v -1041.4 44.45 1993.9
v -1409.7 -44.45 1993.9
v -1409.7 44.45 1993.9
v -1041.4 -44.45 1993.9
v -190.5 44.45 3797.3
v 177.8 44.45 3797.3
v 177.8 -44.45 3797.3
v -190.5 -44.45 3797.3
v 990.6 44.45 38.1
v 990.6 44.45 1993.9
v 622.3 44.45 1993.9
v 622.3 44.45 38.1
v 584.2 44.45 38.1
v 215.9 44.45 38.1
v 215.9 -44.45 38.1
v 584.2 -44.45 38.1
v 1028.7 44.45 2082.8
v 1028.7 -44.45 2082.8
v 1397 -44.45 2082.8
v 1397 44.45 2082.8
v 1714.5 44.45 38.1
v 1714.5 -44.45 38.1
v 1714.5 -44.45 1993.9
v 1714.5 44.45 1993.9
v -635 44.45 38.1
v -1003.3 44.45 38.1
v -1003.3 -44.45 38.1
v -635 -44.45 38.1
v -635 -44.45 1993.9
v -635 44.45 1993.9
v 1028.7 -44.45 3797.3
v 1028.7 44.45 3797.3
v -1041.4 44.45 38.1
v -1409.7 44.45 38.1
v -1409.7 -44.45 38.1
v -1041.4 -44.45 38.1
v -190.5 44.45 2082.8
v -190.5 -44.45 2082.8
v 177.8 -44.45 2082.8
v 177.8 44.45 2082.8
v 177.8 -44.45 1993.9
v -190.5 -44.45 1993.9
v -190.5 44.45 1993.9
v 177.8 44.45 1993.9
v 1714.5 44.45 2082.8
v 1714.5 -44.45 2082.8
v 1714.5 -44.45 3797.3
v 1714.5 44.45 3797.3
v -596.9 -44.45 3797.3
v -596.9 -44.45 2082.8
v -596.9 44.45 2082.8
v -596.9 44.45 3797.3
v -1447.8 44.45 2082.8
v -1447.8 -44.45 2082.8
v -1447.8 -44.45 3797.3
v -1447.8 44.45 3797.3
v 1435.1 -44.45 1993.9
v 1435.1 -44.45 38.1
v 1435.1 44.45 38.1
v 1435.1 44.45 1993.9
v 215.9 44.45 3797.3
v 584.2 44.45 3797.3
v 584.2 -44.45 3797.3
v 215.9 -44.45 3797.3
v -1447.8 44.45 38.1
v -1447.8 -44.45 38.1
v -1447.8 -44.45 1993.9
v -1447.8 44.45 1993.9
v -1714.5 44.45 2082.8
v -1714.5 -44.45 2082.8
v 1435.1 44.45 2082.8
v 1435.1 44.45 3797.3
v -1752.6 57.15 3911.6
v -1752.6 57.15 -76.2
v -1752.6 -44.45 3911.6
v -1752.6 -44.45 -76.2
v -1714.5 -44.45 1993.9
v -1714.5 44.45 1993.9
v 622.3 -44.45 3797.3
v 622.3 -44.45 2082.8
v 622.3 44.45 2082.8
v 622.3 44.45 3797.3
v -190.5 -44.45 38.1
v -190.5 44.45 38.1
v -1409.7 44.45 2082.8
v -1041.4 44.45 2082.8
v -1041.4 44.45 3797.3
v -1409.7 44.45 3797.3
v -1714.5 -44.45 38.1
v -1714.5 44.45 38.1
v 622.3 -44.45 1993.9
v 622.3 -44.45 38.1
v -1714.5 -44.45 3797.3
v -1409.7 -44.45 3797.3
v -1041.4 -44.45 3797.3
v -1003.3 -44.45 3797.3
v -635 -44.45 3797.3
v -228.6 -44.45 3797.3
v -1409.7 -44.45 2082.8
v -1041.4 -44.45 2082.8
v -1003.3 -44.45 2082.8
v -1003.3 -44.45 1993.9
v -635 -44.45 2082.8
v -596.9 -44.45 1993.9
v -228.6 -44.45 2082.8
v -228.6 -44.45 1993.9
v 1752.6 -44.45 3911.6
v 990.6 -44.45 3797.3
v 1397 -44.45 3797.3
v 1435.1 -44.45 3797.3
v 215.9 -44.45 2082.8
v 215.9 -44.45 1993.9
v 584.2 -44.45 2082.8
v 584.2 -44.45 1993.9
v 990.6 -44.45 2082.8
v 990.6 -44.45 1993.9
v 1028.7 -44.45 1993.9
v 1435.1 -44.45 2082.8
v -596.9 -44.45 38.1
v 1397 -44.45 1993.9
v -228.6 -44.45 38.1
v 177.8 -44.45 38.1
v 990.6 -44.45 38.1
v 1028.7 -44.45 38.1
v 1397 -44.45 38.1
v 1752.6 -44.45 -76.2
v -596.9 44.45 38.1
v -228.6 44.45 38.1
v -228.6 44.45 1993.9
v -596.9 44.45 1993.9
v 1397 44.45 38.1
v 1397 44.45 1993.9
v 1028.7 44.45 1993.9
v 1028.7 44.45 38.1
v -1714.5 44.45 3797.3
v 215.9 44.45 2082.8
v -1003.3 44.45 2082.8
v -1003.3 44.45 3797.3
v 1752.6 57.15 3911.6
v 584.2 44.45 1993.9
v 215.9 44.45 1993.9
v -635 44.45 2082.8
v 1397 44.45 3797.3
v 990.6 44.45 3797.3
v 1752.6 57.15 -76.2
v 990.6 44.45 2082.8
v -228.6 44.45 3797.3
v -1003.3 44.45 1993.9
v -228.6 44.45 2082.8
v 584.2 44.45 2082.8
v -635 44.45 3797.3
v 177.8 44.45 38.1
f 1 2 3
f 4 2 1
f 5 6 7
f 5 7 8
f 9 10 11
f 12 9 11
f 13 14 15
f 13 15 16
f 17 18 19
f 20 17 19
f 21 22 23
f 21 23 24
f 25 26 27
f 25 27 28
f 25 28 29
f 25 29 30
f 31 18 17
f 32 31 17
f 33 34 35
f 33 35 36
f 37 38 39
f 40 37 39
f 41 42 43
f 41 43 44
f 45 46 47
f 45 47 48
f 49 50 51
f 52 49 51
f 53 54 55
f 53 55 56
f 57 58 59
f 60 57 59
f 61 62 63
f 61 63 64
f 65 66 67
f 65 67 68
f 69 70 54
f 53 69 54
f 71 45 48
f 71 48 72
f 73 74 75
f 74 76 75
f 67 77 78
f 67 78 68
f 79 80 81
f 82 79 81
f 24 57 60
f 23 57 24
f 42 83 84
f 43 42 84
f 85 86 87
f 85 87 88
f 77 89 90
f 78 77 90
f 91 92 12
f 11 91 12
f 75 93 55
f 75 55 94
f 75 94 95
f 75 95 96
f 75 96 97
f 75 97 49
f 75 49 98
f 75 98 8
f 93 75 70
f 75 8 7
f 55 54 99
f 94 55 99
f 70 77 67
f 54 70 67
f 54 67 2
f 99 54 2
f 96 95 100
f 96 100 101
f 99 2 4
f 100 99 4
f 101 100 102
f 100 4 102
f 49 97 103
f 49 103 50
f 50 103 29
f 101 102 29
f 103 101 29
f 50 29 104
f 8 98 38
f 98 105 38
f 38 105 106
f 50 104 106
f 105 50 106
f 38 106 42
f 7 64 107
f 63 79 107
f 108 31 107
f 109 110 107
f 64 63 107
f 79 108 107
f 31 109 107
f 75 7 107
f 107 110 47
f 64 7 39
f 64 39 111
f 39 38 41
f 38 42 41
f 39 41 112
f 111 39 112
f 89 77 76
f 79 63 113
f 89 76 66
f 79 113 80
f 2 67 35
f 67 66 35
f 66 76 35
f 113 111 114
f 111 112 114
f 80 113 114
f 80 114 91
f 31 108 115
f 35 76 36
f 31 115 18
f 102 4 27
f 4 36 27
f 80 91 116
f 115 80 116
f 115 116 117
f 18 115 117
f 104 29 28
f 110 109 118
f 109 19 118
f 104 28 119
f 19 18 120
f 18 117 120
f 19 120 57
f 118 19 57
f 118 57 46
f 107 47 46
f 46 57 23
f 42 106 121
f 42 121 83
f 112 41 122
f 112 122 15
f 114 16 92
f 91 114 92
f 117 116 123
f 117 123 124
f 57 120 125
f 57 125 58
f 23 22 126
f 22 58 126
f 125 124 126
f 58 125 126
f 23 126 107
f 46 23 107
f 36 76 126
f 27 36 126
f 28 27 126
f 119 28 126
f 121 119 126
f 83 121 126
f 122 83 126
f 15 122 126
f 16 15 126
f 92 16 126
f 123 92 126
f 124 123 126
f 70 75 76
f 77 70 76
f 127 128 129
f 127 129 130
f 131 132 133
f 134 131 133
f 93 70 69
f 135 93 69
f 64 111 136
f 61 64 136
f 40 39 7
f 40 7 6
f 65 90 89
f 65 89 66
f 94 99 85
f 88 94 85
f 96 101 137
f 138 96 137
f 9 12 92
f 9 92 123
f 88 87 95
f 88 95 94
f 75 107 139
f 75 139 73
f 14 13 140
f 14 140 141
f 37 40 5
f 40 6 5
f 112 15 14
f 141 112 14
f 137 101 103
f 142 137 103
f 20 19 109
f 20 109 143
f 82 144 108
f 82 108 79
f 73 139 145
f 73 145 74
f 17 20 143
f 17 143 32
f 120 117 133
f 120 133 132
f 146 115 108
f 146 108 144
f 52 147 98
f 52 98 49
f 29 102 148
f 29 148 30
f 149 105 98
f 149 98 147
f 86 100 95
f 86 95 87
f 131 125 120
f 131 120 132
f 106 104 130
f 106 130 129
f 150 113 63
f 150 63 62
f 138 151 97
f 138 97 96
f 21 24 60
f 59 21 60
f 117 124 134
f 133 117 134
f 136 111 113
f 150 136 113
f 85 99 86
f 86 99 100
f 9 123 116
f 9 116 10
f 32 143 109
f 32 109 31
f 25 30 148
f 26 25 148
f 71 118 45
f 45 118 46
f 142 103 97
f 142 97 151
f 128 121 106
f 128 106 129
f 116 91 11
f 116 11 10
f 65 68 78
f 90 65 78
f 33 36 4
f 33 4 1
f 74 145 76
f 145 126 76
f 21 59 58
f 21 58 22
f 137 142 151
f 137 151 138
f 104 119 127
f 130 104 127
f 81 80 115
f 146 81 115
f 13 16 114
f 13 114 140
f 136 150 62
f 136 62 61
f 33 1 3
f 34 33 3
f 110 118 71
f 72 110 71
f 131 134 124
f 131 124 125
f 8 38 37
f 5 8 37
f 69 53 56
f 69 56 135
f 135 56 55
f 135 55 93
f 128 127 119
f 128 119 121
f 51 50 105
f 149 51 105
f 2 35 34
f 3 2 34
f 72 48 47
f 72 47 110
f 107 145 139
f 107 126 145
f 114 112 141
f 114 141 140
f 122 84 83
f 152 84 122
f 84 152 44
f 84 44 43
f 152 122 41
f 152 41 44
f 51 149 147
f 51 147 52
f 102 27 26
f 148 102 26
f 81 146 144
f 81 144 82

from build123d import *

# Parameters (mm, degrees)
F0_W      = 3505.2
F0_H      = 88.9
F1_DEPTH  = 38.1
F2_W      = 38.1
F2_H      = 88.9
F3_DEPTH  = 3759.2
F4_W      = 3505.2
F4_H      = 88.9
F5_DEPTH  = 76.2
F6_W      = 3505.2
F6_H      = 38.1
F7_DEPTH  = 88.9
F8_W      = 3505.2
F8_H      = 88.9
F9_DEPTH  = 76.2
F10_W     = 3505.2
F10_H     = 88.9
F11_DEPTH = 88.9
F12_W     = 3505.2
F12_H     = 3987.8
F13_DEPTH = 12.7


with BuildPart() as f1:
    # F0 (on Top) → F1 (new body)
    with BuildSketch(Plane.XY):
        Rectangle(F0_W, F0_H)
    extrude(amount=F1_DEPTH)

    # F2 (on face) → F3 (join)
    with BuildSketch(Plane.XY.offset(38.1)):
        with Locations((1733.55, 0)):
            Rectangle(F2_W, F2_H)
        with Locations((1416.05, 0)):
            Rectangle(F2_W, F2_H)
        with Locations((1009.65, 0)):
            Rectangle(F2_W, F2_H)
        with Locations((603.25, 0)):
            Rectangle(F2_W, F2_H)
        with Locations((196.85, 0)):
            Rectangle(F2_W, F2_H)
        with Locations((-209.55, 0)):
            Rectangle(F2_W, F2_H)
        with Locations((-615.95, 0)):
            Rectangle(F2_W, F2_H)
        with Locations((-1022.35, 0)):
            Rectangle(F2_W, F2_H)
        with Locations((-1733.55, 0)):
            Rectangle(F2_W, F2_H)
        with Locations((-1428.75, 0)):
            Rectangle(F2_W, F2_H)
    extrude(amount=F3_DEPTH)

    # F4 (on face) → F5 (join)
    with BuildSketch(Plane(origin=(0, 0, 0), x_dir=(1, 0, 0), z_dir=(0, 0, -1))):
        Rectangle(F4_W, F4_H)
    extrude(amount=F5_DEPTH)

    # F6 (on face) → F7 (join)
    with BuildSketch(Plane(origin=(0, 44.45, 0), x_dir=(-1, 0, 0), z_dir=(0, 1, 0))):
        with Locations((0, 3816.35)):
            Rectangle(F6_W, F6_H)
    extrude(amount=-F7_DEPTH)

    # F8 (on face) → F9 (join)
    with BuildSketch(Plane.XY.offset(3835.4)):
        Rectangle(F8_W, F8_H)
    extrude(amount=F9_DEPTH)

    # F10 (on face) → F11 (join)
    with BuildSketch(Plane.XZ.offset(44.45)):
        with Locations((0, 2038.35)):
            Rectangle(F10_W, F10_H)
    extrude(amount=-F11_DEPTH)

    # F12 (on face) → F13 (join)
    with BuildSketch(Plane(origin=(0, 44.45, 0), x_dir=(-1, 0, 0), z_dir=(0, 1, 0))):
        with Locations((0, 1917.7)):
            Rectangle(F12_W, F12_H)
    extrude(amount=F13_DEPTH)


solid = f1.part
